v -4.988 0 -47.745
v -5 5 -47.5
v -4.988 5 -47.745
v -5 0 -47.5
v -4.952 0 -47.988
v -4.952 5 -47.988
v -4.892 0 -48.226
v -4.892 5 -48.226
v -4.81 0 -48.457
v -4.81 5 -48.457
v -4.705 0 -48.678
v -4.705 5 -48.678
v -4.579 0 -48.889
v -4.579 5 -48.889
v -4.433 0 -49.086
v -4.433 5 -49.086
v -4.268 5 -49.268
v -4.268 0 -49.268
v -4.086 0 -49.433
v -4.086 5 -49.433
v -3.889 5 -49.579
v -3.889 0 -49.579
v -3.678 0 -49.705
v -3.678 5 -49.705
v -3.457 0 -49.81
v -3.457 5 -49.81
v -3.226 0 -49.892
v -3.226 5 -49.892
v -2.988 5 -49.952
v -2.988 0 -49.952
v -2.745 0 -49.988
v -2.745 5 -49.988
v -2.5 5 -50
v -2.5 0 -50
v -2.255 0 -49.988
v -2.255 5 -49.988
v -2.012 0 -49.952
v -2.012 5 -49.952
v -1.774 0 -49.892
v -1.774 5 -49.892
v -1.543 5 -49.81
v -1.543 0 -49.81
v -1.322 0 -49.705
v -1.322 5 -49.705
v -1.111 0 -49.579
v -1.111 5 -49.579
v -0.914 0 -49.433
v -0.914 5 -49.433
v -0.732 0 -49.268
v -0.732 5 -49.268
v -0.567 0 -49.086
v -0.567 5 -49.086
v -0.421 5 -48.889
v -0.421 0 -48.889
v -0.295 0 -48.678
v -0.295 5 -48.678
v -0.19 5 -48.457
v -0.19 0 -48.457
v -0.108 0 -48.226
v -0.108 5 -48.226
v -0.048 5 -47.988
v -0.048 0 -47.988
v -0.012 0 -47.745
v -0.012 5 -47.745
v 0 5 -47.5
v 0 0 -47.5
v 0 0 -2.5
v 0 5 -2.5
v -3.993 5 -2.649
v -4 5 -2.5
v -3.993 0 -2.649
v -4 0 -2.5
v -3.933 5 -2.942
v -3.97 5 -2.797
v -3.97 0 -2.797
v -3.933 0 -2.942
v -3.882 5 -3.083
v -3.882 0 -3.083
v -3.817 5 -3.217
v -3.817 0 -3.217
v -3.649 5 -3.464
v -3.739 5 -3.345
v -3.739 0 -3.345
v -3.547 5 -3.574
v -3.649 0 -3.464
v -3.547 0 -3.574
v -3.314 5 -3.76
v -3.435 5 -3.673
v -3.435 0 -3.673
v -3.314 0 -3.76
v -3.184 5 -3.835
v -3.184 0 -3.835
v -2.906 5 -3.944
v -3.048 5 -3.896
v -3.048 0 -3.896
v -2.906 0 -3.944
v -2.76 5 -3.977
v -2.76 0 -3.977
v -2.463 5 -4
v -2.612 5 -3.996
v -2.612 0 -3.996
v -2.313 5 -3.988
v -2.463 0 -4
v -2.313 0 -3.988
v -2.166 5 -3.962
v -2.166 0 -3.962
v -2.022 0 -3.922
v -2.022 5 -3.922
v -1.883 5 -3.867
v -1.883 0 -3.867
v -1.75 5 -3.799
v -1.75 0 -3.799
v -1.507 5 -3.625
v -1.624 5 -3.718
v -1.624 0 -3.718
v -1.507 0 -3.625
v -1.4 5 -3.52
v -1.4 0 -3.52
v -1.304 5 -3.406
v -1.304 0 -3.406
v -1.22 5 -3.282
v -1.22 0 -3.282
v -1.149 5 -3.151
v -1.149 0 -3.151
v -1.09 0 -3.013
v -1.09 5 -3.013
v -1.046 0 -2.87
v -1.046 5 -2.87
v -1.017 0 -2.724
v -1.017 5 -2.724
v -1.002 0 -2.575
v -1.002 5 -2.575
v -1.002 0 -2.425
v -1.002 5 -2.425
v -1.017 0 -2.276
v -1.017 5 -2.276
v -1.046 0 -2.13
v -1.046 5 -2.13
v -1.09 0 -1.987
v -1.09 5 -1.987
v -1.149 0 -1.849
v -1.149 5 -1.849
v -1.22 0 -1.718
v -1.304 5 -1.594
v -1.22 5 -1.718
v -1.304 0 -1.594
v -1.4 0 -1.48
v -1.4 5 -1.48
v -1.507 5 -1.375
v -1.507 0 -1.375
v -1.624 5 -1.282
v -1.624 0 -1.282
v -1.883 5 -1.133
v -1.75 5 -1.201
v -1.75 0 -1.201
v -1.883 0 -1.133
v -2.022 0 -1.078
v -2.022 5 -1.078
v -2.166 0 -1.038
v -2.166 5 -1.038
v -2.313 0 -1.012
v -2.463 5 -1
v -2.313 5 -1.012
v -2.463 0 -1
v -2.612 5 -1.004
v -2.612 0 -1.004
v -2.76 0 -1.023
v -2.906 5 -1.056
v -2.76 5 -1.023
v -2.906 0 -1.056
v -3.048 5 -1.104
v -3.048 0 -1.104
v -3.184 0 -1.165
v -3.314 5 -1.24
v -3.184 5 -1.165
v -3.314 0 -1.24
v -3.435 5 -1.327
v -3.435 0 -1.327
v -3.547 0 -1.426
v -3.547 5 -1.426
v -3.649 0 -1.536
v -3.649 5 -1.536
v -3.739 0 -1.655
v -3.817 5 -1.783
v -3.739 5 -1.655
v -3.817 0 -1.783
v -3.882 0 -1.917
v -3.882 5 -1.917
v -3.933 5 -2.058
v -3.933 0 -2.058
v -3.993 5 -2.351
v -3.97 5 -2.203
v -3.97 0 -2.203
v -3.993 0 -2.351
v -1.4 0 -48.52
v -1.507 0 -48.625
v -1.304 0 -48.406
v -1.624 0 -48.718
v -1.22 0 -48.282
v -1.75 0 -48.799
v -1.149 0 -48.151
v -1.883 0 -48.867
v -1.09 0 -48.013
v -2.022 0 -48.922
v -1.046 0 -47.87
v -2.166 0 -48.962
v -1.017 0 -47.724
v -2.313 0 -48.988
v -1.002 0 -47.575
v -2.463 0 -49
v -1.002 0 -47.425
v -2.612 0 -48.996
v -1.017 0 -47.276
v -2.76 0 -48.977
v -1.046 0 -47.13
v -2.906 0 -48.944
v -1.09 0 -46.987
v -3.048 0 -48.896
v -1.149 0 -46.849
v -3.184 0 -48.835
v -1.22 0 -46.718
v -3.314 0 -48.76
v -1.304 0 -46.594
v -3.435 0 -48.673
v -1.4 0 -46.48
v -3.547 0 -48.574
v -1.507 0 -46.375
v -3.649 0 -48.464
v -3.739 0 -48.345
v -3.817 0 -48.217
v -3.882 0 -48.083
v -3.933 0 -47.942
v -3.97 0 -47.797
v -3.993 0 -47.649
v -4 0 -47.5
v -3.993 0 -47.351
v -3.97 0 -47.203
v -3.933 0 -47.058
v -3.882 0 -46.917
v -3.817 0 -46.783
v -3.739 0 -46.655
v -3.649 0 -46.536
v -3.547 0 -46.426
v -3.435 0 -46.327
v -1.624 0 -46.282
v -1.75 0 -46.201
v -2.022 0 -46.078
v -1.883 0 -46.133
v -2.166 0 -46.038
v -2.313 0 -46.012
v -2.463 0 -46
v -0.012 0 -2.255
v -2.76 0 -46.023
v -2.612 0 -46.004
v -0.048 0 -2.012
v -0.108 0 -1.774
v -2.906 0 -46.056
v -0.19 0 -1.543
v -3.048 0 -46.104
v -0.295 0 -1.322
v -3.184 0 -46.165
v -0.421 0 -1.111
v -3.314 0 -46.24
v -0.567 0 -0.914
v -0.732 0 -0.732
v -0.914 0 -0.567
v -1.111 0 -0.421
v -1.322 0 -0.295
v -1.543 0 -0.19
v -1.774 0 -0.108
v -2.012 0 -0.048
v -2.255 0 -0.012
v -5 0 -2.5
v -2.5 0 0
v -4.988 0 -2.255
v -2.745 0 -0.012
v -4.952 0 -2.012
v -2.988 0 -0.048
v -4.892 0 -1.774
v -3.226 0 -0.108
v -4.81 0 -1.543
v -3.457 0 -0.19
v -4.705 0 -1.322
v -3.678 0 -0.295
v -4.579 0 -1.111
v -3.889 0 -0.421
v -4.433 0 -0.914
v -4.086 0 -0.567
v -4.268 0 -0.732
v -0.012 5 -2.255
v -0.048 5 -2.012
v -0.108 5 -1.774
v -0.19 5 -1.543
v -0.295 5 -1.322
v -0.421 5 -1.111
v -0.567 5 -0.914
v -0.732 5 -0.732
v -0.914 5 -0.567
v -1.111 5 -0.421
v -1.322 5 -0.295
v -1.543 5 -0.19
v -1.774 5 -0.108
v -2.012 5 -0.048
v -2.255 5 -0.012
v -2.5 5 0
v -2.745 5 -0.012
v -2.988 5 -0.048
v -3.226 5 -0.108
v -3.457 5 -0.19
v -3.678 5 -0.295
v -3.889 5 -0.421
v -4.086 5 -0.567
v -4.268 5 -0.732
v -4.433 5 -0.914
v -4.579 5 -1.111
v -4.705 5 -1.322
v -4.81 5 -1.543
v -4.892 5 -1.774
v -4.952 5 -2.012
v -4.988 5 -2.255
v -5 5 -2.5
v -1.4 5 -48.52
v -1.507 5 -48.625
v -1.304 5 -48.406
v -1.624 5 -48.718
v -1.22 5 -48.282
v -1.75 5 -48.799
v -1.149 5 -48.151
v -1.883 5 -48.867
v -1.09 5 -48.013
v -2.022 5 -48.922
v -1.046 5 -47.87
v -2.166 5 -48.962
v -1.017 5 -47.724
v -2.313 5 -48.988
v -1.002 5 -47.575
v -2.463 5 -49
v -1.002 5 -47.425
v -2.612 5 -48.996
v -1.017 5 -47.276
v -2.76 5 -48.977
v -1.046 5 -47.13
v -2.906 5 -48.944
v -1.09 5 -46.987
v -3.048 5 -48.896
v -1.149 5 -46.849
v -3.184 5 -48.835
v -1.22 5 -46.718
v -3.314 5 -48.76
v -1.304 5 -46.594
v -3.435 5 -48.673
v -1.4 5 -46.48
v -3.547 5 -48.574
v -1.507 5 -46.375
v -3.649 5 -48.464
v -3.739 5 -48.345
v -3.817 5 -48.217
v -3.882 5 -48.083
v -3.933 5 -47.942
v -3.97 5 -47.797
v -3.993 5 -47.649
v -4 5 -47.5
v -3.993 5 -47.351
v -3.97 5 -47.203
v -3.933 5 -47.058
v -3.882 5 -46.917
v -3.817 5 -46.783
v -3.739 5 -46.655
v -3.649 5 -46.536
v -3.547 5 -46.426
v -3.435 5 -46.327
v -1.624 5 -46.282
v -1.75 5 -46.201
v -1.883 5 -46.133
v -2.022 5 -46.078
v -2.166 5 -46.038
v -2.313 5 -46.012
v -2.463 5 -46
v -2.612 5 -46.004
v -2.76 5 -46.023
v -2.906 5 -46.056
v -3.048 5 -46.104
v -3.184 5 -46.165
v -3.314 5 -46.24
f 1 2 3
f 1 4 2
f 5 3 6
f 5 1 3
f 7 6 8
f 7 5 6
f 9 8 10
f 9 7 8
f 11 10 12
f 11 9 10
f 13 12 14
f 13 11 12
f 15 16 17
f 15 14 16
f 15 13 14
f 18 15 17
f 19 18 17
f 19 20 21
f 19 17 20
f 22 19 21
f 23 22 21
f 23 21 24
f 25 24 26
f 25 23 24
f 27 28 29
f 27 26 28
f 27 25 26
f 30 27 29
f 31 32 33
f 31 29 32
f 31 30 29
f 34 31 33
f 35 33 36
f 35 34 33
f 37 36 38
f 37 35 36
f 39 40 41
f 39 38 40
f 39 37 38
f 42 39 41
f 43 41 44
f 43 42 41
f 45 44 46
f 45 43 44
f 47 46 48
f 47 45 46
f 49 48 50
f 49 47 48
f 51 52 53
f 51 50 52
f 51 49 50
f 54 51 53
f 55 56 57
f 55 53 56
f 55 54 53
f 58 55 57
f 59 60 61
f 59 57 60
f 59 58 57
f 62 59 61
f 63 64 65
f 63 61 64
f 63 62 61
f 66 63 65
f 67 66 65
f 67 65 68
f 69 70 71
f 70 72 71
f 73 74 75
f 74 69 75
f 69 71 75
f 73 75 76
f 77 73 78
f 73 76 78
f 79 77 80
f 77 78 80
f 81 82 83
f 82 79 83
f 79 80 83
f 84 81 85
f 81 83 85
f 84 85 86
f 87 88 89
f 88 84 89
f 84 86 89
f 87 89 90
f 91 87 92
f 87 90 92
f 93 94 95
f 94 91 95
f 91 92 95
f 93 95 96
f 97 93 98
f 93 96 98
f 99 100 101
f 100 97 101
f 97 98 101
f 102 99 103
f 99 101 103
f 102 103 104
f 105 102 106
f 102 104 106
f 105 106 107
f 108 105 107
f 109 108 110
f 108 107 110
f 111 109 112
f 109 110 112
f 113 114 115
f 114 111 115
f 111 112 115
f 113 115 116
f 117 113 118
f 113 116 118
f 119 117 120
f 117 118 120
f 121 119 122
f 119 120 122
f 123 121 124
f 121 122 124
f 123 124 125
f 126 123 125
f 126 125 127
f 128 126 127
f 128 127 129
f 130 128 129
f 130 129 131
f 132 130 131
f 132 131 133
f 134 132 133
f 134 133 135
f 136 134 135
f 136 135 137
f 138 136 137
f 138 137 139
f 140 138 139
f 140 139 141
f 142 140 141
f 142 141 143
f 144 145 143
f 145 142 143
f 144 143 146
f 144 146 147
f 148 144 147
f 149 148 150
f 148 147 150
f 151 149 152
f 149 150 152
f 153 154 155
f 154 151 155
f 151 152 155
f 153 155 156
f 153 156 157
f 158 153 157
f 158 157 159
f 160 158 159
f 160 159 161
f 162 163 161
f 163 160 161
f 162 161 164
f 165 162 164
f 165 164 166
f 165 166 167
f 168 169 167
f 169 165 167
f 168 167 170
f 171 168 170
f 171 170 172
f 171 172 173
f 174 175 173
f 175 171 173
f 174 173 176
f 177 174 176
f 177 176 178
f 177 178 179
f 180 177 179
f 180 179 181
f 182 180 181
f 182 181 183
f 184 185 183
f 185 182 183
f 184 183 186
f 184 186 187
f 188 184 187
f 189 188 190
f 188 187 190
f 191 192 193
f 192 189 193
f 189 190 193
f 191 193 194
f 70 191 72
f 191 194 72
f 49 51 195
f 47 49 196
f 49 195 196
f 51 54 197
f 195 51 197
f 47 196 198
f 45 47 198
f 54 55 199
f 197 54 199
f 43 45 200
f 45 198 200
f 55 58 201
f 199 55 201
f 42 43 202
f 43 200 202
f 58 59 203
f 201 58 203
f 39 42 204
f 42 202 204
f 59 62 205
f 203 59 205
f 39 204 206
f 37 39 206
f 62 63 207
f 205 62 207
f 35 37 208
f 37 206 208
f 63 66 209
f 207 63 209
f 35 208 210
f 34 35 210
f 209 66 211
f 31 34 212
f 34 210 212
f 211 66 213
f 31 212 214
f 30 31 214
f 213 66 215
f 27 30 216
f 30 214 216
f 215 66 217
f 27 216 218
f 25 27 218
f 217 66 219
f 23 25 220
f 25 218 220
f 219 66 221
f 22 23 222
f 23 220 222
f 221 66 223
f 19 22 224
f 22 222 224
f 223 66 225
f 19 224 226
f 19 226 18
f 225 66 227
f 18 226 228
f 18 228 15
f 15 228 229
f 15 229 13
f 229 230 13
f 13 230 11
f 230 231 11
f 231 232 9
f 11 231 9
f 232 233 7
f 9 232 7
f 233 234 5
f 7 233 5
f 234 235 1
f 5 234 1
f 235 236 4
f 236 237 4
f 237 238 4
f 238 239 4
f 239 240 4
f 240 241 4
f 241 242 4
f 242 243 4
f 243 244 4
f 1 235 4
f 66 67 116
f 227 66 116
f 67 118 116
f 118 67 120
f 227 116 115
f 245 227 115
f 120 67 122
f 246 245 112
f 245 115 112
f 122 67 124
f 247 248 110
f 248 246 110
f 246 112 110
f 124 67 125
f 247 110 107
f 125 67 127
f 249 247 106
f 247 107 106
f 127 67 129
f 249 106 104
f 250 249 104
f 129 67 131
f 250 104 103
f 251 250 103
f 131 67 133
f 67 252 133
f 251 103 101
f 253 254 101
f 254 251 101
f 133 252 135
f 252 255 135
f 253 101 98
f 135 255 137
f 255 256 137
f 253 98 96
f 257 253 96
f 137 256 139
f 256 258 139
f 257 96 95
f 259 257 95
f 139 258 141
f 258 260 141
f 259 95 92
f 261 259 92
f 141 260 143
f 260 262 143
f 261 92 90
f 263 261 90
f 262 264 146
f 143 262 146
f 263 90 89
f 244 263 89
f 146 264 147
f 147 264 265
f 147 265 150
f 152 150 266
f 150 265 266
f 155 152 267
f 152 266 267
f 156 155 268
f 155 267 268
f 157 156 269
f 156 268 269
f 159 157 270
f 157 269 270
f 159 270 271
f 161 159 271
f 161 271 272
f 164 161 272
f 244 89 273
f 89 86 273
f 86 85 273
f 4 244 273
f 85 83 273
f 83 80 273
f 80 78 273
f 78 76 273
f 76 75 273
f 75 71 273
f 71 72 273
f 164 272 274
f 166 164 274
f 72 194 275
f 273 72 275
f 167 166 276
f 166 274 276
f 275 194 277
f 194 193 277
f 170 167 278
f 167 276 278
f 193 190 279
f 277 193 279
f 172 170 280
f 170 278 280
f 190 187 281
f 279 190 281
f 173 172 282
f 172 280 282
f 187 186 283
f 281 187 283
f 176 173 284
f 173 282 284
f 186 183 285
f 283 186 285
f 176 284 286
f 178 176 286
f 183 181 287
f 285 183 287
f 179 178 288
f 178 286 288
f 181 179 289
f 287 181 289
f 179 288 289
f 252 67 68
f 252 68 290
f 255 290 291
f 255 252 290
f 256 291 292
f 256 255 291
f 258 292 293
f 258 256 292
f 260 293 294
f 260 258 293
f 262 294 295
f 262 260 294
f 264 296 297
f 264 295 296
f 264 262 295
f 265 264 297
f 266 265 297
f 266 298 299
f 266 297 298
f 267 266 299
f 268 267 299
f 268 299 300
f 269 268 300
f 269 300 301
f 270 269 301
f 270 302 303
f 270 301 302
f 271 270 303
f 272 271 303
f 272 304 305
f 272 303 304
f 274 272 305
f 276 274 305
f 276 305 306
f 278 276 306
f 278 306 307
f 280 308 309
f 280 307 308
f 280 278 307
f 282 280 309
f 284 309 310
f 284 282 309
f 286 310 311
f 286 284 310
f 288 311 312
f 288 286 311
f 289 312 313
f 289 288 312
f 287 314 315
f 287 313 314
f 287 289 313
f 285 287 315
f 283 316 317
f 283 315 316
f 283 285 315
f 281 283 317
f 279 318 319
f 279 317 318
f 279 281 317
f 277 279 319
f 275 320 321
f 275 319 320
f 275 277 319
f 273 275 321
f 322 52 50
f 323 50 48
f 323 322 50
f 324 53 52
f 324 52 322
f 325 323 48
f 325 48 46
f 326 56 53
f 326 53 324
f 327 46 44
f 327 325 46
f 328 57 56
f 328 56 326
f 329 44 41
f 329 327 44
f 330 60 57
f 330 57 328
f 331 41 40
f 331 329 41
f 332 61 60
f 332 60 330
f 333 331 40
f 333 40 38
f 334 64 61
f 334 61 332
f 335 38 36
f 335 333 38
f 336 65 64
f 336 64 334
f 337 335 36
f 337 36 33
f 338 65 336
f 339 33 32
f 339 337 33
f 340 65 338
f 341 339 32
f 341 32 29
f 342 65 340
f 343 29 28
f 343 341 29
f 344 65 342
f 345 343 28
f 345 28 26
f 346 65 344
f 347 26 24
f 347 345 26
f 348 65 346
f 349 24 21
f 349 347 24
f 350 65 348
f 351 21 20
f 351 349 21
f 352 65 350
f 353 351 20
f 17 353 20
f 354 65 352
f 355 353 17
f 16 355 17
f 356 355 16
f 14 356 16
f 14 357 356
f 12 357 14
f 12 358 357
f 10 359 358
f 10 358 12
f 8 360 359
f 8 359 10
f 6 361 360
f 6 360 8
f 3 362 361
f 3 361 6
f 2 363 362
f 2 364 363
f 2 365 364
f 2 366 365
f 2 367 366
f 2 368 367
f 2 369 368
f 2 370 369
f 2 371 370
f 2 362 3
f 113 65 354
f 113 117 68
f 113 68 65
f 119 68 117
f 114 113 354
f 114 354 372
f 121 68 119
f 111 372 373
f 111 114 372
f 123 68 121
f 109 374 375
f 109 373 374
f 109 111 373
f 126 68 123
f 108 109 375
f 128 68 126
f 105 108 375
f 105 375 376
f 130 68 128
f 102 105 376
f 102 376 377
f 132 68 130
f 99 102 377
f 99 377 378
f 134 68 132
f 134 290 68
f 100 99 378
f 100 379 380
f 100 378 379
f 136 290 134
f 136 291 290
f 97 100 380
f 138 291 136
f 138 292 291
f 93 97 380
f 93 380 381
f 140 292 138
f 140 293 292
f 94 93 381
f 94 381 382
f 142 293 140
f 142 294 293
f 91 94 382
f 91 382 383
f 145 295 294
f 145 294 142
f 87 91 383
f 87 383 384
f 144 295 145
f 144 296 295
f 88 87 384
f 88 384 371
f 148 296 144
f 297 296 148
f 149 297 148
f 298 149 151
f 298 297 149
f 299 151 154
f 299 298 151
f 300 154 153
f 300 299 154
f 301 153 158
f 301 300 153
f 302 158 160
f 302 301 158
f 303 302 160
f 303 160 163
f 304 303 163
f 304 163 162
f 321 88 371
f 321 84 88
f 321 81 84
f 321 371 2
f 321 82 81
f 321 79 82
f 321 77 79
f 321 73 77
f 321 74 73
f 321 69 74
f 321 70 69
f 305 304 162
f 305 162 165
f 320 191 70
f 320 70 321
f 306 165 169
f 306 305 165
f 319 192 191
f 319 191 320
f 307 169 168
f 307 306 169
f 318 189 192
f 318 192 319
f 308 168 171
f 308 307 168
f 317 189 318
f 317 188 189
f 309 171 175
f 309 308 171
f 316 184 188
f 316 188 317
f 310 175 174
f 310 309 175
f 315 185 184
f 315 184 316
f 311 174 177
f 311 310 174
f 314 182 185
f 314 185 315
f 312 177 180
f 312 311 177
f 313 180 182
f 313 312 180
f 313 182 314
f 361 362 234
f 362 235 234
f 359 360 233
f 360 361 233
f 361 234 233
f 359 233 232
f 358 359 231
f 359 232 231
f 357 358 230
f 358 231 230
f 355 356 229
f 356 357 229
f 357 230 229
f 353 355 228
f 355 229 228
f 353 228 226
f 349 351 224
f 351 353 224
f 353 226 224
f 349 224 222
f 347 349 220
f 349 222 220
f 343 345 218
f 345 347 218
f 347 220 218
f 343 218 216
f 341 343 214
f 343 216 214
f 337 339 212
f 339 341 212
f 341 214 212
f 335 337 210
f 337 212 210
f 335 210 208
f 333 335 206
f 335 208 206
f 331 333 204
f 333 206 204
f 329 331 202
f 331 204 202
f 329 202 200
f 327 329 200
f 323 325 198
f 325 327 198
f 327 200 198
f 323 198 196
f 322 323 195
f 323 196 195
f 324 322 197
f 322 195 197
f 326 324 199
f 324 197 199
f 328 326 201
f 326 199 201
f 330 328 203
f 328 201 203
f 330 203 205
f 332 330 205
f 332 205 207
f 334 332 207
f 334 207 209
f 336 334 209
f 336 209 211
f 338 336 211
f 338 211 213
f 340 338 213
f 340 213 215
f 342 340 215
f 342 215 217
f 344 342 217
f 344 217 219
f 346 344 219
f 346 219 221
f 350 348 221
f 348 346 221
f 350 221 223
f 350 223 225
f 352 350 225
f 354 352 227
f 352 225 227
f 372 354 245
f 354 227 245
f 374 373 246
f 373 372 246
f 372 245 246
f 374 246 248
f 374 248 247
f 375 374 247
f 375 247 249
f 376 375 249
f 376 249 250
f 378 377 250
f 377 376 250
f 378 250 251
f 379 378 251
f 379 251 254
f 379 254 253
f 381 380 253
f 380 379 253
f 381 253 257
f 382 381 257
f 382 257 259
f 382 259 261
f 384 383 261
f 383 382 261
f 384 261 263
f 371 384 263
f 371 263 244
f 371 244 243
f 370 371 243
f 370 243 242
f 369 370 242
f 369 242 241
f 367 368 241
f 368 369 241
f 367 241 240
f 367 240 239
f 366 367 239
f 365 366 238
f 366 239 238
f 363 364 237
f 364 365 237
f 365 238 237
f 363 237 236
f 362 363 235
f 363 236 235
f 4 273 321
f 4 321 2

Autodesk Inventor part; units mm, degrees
ref_plane "YZ Plane" through (0, 0, 0) normal (1, 0, 0) x (0, 1, 0)
ref_plane "XZ Plane" through (0, 0, 0) normal (0, 1, 0) x (-1, 0, 0)
ref_plane "XY Plane" through (0, 0, 0) normal (0, 0, 1) x (1, 0, 0)
sketch "Sketch1" plane through (0, 0, 0) normal (0, 1, 0) x (-1, 0, 0)
  line L0 (5, -2.5) -> (5, -47.5)
  line L1 (0, -47.5) -> (0, -2.5)
  arc A0 (5, -2.5) -> (0, -2.5) centre (2.5, -2.5) ccw
  arc A1 (0, -47.5) -> (5, -47.5) centre (2.5, -47.5) ccw
  circle A2 centre (2.5, -2.5) radius 1.5
  circle A3 centre (2.5, -47.5) radius 1.5
  point P0 (0, 0)
  dimension "d2" = 3
  dimension "d3" = 3
extrude "Extrusion1" add sketch "Sketch1" along normal blind 5
properties part number "gripper1"
